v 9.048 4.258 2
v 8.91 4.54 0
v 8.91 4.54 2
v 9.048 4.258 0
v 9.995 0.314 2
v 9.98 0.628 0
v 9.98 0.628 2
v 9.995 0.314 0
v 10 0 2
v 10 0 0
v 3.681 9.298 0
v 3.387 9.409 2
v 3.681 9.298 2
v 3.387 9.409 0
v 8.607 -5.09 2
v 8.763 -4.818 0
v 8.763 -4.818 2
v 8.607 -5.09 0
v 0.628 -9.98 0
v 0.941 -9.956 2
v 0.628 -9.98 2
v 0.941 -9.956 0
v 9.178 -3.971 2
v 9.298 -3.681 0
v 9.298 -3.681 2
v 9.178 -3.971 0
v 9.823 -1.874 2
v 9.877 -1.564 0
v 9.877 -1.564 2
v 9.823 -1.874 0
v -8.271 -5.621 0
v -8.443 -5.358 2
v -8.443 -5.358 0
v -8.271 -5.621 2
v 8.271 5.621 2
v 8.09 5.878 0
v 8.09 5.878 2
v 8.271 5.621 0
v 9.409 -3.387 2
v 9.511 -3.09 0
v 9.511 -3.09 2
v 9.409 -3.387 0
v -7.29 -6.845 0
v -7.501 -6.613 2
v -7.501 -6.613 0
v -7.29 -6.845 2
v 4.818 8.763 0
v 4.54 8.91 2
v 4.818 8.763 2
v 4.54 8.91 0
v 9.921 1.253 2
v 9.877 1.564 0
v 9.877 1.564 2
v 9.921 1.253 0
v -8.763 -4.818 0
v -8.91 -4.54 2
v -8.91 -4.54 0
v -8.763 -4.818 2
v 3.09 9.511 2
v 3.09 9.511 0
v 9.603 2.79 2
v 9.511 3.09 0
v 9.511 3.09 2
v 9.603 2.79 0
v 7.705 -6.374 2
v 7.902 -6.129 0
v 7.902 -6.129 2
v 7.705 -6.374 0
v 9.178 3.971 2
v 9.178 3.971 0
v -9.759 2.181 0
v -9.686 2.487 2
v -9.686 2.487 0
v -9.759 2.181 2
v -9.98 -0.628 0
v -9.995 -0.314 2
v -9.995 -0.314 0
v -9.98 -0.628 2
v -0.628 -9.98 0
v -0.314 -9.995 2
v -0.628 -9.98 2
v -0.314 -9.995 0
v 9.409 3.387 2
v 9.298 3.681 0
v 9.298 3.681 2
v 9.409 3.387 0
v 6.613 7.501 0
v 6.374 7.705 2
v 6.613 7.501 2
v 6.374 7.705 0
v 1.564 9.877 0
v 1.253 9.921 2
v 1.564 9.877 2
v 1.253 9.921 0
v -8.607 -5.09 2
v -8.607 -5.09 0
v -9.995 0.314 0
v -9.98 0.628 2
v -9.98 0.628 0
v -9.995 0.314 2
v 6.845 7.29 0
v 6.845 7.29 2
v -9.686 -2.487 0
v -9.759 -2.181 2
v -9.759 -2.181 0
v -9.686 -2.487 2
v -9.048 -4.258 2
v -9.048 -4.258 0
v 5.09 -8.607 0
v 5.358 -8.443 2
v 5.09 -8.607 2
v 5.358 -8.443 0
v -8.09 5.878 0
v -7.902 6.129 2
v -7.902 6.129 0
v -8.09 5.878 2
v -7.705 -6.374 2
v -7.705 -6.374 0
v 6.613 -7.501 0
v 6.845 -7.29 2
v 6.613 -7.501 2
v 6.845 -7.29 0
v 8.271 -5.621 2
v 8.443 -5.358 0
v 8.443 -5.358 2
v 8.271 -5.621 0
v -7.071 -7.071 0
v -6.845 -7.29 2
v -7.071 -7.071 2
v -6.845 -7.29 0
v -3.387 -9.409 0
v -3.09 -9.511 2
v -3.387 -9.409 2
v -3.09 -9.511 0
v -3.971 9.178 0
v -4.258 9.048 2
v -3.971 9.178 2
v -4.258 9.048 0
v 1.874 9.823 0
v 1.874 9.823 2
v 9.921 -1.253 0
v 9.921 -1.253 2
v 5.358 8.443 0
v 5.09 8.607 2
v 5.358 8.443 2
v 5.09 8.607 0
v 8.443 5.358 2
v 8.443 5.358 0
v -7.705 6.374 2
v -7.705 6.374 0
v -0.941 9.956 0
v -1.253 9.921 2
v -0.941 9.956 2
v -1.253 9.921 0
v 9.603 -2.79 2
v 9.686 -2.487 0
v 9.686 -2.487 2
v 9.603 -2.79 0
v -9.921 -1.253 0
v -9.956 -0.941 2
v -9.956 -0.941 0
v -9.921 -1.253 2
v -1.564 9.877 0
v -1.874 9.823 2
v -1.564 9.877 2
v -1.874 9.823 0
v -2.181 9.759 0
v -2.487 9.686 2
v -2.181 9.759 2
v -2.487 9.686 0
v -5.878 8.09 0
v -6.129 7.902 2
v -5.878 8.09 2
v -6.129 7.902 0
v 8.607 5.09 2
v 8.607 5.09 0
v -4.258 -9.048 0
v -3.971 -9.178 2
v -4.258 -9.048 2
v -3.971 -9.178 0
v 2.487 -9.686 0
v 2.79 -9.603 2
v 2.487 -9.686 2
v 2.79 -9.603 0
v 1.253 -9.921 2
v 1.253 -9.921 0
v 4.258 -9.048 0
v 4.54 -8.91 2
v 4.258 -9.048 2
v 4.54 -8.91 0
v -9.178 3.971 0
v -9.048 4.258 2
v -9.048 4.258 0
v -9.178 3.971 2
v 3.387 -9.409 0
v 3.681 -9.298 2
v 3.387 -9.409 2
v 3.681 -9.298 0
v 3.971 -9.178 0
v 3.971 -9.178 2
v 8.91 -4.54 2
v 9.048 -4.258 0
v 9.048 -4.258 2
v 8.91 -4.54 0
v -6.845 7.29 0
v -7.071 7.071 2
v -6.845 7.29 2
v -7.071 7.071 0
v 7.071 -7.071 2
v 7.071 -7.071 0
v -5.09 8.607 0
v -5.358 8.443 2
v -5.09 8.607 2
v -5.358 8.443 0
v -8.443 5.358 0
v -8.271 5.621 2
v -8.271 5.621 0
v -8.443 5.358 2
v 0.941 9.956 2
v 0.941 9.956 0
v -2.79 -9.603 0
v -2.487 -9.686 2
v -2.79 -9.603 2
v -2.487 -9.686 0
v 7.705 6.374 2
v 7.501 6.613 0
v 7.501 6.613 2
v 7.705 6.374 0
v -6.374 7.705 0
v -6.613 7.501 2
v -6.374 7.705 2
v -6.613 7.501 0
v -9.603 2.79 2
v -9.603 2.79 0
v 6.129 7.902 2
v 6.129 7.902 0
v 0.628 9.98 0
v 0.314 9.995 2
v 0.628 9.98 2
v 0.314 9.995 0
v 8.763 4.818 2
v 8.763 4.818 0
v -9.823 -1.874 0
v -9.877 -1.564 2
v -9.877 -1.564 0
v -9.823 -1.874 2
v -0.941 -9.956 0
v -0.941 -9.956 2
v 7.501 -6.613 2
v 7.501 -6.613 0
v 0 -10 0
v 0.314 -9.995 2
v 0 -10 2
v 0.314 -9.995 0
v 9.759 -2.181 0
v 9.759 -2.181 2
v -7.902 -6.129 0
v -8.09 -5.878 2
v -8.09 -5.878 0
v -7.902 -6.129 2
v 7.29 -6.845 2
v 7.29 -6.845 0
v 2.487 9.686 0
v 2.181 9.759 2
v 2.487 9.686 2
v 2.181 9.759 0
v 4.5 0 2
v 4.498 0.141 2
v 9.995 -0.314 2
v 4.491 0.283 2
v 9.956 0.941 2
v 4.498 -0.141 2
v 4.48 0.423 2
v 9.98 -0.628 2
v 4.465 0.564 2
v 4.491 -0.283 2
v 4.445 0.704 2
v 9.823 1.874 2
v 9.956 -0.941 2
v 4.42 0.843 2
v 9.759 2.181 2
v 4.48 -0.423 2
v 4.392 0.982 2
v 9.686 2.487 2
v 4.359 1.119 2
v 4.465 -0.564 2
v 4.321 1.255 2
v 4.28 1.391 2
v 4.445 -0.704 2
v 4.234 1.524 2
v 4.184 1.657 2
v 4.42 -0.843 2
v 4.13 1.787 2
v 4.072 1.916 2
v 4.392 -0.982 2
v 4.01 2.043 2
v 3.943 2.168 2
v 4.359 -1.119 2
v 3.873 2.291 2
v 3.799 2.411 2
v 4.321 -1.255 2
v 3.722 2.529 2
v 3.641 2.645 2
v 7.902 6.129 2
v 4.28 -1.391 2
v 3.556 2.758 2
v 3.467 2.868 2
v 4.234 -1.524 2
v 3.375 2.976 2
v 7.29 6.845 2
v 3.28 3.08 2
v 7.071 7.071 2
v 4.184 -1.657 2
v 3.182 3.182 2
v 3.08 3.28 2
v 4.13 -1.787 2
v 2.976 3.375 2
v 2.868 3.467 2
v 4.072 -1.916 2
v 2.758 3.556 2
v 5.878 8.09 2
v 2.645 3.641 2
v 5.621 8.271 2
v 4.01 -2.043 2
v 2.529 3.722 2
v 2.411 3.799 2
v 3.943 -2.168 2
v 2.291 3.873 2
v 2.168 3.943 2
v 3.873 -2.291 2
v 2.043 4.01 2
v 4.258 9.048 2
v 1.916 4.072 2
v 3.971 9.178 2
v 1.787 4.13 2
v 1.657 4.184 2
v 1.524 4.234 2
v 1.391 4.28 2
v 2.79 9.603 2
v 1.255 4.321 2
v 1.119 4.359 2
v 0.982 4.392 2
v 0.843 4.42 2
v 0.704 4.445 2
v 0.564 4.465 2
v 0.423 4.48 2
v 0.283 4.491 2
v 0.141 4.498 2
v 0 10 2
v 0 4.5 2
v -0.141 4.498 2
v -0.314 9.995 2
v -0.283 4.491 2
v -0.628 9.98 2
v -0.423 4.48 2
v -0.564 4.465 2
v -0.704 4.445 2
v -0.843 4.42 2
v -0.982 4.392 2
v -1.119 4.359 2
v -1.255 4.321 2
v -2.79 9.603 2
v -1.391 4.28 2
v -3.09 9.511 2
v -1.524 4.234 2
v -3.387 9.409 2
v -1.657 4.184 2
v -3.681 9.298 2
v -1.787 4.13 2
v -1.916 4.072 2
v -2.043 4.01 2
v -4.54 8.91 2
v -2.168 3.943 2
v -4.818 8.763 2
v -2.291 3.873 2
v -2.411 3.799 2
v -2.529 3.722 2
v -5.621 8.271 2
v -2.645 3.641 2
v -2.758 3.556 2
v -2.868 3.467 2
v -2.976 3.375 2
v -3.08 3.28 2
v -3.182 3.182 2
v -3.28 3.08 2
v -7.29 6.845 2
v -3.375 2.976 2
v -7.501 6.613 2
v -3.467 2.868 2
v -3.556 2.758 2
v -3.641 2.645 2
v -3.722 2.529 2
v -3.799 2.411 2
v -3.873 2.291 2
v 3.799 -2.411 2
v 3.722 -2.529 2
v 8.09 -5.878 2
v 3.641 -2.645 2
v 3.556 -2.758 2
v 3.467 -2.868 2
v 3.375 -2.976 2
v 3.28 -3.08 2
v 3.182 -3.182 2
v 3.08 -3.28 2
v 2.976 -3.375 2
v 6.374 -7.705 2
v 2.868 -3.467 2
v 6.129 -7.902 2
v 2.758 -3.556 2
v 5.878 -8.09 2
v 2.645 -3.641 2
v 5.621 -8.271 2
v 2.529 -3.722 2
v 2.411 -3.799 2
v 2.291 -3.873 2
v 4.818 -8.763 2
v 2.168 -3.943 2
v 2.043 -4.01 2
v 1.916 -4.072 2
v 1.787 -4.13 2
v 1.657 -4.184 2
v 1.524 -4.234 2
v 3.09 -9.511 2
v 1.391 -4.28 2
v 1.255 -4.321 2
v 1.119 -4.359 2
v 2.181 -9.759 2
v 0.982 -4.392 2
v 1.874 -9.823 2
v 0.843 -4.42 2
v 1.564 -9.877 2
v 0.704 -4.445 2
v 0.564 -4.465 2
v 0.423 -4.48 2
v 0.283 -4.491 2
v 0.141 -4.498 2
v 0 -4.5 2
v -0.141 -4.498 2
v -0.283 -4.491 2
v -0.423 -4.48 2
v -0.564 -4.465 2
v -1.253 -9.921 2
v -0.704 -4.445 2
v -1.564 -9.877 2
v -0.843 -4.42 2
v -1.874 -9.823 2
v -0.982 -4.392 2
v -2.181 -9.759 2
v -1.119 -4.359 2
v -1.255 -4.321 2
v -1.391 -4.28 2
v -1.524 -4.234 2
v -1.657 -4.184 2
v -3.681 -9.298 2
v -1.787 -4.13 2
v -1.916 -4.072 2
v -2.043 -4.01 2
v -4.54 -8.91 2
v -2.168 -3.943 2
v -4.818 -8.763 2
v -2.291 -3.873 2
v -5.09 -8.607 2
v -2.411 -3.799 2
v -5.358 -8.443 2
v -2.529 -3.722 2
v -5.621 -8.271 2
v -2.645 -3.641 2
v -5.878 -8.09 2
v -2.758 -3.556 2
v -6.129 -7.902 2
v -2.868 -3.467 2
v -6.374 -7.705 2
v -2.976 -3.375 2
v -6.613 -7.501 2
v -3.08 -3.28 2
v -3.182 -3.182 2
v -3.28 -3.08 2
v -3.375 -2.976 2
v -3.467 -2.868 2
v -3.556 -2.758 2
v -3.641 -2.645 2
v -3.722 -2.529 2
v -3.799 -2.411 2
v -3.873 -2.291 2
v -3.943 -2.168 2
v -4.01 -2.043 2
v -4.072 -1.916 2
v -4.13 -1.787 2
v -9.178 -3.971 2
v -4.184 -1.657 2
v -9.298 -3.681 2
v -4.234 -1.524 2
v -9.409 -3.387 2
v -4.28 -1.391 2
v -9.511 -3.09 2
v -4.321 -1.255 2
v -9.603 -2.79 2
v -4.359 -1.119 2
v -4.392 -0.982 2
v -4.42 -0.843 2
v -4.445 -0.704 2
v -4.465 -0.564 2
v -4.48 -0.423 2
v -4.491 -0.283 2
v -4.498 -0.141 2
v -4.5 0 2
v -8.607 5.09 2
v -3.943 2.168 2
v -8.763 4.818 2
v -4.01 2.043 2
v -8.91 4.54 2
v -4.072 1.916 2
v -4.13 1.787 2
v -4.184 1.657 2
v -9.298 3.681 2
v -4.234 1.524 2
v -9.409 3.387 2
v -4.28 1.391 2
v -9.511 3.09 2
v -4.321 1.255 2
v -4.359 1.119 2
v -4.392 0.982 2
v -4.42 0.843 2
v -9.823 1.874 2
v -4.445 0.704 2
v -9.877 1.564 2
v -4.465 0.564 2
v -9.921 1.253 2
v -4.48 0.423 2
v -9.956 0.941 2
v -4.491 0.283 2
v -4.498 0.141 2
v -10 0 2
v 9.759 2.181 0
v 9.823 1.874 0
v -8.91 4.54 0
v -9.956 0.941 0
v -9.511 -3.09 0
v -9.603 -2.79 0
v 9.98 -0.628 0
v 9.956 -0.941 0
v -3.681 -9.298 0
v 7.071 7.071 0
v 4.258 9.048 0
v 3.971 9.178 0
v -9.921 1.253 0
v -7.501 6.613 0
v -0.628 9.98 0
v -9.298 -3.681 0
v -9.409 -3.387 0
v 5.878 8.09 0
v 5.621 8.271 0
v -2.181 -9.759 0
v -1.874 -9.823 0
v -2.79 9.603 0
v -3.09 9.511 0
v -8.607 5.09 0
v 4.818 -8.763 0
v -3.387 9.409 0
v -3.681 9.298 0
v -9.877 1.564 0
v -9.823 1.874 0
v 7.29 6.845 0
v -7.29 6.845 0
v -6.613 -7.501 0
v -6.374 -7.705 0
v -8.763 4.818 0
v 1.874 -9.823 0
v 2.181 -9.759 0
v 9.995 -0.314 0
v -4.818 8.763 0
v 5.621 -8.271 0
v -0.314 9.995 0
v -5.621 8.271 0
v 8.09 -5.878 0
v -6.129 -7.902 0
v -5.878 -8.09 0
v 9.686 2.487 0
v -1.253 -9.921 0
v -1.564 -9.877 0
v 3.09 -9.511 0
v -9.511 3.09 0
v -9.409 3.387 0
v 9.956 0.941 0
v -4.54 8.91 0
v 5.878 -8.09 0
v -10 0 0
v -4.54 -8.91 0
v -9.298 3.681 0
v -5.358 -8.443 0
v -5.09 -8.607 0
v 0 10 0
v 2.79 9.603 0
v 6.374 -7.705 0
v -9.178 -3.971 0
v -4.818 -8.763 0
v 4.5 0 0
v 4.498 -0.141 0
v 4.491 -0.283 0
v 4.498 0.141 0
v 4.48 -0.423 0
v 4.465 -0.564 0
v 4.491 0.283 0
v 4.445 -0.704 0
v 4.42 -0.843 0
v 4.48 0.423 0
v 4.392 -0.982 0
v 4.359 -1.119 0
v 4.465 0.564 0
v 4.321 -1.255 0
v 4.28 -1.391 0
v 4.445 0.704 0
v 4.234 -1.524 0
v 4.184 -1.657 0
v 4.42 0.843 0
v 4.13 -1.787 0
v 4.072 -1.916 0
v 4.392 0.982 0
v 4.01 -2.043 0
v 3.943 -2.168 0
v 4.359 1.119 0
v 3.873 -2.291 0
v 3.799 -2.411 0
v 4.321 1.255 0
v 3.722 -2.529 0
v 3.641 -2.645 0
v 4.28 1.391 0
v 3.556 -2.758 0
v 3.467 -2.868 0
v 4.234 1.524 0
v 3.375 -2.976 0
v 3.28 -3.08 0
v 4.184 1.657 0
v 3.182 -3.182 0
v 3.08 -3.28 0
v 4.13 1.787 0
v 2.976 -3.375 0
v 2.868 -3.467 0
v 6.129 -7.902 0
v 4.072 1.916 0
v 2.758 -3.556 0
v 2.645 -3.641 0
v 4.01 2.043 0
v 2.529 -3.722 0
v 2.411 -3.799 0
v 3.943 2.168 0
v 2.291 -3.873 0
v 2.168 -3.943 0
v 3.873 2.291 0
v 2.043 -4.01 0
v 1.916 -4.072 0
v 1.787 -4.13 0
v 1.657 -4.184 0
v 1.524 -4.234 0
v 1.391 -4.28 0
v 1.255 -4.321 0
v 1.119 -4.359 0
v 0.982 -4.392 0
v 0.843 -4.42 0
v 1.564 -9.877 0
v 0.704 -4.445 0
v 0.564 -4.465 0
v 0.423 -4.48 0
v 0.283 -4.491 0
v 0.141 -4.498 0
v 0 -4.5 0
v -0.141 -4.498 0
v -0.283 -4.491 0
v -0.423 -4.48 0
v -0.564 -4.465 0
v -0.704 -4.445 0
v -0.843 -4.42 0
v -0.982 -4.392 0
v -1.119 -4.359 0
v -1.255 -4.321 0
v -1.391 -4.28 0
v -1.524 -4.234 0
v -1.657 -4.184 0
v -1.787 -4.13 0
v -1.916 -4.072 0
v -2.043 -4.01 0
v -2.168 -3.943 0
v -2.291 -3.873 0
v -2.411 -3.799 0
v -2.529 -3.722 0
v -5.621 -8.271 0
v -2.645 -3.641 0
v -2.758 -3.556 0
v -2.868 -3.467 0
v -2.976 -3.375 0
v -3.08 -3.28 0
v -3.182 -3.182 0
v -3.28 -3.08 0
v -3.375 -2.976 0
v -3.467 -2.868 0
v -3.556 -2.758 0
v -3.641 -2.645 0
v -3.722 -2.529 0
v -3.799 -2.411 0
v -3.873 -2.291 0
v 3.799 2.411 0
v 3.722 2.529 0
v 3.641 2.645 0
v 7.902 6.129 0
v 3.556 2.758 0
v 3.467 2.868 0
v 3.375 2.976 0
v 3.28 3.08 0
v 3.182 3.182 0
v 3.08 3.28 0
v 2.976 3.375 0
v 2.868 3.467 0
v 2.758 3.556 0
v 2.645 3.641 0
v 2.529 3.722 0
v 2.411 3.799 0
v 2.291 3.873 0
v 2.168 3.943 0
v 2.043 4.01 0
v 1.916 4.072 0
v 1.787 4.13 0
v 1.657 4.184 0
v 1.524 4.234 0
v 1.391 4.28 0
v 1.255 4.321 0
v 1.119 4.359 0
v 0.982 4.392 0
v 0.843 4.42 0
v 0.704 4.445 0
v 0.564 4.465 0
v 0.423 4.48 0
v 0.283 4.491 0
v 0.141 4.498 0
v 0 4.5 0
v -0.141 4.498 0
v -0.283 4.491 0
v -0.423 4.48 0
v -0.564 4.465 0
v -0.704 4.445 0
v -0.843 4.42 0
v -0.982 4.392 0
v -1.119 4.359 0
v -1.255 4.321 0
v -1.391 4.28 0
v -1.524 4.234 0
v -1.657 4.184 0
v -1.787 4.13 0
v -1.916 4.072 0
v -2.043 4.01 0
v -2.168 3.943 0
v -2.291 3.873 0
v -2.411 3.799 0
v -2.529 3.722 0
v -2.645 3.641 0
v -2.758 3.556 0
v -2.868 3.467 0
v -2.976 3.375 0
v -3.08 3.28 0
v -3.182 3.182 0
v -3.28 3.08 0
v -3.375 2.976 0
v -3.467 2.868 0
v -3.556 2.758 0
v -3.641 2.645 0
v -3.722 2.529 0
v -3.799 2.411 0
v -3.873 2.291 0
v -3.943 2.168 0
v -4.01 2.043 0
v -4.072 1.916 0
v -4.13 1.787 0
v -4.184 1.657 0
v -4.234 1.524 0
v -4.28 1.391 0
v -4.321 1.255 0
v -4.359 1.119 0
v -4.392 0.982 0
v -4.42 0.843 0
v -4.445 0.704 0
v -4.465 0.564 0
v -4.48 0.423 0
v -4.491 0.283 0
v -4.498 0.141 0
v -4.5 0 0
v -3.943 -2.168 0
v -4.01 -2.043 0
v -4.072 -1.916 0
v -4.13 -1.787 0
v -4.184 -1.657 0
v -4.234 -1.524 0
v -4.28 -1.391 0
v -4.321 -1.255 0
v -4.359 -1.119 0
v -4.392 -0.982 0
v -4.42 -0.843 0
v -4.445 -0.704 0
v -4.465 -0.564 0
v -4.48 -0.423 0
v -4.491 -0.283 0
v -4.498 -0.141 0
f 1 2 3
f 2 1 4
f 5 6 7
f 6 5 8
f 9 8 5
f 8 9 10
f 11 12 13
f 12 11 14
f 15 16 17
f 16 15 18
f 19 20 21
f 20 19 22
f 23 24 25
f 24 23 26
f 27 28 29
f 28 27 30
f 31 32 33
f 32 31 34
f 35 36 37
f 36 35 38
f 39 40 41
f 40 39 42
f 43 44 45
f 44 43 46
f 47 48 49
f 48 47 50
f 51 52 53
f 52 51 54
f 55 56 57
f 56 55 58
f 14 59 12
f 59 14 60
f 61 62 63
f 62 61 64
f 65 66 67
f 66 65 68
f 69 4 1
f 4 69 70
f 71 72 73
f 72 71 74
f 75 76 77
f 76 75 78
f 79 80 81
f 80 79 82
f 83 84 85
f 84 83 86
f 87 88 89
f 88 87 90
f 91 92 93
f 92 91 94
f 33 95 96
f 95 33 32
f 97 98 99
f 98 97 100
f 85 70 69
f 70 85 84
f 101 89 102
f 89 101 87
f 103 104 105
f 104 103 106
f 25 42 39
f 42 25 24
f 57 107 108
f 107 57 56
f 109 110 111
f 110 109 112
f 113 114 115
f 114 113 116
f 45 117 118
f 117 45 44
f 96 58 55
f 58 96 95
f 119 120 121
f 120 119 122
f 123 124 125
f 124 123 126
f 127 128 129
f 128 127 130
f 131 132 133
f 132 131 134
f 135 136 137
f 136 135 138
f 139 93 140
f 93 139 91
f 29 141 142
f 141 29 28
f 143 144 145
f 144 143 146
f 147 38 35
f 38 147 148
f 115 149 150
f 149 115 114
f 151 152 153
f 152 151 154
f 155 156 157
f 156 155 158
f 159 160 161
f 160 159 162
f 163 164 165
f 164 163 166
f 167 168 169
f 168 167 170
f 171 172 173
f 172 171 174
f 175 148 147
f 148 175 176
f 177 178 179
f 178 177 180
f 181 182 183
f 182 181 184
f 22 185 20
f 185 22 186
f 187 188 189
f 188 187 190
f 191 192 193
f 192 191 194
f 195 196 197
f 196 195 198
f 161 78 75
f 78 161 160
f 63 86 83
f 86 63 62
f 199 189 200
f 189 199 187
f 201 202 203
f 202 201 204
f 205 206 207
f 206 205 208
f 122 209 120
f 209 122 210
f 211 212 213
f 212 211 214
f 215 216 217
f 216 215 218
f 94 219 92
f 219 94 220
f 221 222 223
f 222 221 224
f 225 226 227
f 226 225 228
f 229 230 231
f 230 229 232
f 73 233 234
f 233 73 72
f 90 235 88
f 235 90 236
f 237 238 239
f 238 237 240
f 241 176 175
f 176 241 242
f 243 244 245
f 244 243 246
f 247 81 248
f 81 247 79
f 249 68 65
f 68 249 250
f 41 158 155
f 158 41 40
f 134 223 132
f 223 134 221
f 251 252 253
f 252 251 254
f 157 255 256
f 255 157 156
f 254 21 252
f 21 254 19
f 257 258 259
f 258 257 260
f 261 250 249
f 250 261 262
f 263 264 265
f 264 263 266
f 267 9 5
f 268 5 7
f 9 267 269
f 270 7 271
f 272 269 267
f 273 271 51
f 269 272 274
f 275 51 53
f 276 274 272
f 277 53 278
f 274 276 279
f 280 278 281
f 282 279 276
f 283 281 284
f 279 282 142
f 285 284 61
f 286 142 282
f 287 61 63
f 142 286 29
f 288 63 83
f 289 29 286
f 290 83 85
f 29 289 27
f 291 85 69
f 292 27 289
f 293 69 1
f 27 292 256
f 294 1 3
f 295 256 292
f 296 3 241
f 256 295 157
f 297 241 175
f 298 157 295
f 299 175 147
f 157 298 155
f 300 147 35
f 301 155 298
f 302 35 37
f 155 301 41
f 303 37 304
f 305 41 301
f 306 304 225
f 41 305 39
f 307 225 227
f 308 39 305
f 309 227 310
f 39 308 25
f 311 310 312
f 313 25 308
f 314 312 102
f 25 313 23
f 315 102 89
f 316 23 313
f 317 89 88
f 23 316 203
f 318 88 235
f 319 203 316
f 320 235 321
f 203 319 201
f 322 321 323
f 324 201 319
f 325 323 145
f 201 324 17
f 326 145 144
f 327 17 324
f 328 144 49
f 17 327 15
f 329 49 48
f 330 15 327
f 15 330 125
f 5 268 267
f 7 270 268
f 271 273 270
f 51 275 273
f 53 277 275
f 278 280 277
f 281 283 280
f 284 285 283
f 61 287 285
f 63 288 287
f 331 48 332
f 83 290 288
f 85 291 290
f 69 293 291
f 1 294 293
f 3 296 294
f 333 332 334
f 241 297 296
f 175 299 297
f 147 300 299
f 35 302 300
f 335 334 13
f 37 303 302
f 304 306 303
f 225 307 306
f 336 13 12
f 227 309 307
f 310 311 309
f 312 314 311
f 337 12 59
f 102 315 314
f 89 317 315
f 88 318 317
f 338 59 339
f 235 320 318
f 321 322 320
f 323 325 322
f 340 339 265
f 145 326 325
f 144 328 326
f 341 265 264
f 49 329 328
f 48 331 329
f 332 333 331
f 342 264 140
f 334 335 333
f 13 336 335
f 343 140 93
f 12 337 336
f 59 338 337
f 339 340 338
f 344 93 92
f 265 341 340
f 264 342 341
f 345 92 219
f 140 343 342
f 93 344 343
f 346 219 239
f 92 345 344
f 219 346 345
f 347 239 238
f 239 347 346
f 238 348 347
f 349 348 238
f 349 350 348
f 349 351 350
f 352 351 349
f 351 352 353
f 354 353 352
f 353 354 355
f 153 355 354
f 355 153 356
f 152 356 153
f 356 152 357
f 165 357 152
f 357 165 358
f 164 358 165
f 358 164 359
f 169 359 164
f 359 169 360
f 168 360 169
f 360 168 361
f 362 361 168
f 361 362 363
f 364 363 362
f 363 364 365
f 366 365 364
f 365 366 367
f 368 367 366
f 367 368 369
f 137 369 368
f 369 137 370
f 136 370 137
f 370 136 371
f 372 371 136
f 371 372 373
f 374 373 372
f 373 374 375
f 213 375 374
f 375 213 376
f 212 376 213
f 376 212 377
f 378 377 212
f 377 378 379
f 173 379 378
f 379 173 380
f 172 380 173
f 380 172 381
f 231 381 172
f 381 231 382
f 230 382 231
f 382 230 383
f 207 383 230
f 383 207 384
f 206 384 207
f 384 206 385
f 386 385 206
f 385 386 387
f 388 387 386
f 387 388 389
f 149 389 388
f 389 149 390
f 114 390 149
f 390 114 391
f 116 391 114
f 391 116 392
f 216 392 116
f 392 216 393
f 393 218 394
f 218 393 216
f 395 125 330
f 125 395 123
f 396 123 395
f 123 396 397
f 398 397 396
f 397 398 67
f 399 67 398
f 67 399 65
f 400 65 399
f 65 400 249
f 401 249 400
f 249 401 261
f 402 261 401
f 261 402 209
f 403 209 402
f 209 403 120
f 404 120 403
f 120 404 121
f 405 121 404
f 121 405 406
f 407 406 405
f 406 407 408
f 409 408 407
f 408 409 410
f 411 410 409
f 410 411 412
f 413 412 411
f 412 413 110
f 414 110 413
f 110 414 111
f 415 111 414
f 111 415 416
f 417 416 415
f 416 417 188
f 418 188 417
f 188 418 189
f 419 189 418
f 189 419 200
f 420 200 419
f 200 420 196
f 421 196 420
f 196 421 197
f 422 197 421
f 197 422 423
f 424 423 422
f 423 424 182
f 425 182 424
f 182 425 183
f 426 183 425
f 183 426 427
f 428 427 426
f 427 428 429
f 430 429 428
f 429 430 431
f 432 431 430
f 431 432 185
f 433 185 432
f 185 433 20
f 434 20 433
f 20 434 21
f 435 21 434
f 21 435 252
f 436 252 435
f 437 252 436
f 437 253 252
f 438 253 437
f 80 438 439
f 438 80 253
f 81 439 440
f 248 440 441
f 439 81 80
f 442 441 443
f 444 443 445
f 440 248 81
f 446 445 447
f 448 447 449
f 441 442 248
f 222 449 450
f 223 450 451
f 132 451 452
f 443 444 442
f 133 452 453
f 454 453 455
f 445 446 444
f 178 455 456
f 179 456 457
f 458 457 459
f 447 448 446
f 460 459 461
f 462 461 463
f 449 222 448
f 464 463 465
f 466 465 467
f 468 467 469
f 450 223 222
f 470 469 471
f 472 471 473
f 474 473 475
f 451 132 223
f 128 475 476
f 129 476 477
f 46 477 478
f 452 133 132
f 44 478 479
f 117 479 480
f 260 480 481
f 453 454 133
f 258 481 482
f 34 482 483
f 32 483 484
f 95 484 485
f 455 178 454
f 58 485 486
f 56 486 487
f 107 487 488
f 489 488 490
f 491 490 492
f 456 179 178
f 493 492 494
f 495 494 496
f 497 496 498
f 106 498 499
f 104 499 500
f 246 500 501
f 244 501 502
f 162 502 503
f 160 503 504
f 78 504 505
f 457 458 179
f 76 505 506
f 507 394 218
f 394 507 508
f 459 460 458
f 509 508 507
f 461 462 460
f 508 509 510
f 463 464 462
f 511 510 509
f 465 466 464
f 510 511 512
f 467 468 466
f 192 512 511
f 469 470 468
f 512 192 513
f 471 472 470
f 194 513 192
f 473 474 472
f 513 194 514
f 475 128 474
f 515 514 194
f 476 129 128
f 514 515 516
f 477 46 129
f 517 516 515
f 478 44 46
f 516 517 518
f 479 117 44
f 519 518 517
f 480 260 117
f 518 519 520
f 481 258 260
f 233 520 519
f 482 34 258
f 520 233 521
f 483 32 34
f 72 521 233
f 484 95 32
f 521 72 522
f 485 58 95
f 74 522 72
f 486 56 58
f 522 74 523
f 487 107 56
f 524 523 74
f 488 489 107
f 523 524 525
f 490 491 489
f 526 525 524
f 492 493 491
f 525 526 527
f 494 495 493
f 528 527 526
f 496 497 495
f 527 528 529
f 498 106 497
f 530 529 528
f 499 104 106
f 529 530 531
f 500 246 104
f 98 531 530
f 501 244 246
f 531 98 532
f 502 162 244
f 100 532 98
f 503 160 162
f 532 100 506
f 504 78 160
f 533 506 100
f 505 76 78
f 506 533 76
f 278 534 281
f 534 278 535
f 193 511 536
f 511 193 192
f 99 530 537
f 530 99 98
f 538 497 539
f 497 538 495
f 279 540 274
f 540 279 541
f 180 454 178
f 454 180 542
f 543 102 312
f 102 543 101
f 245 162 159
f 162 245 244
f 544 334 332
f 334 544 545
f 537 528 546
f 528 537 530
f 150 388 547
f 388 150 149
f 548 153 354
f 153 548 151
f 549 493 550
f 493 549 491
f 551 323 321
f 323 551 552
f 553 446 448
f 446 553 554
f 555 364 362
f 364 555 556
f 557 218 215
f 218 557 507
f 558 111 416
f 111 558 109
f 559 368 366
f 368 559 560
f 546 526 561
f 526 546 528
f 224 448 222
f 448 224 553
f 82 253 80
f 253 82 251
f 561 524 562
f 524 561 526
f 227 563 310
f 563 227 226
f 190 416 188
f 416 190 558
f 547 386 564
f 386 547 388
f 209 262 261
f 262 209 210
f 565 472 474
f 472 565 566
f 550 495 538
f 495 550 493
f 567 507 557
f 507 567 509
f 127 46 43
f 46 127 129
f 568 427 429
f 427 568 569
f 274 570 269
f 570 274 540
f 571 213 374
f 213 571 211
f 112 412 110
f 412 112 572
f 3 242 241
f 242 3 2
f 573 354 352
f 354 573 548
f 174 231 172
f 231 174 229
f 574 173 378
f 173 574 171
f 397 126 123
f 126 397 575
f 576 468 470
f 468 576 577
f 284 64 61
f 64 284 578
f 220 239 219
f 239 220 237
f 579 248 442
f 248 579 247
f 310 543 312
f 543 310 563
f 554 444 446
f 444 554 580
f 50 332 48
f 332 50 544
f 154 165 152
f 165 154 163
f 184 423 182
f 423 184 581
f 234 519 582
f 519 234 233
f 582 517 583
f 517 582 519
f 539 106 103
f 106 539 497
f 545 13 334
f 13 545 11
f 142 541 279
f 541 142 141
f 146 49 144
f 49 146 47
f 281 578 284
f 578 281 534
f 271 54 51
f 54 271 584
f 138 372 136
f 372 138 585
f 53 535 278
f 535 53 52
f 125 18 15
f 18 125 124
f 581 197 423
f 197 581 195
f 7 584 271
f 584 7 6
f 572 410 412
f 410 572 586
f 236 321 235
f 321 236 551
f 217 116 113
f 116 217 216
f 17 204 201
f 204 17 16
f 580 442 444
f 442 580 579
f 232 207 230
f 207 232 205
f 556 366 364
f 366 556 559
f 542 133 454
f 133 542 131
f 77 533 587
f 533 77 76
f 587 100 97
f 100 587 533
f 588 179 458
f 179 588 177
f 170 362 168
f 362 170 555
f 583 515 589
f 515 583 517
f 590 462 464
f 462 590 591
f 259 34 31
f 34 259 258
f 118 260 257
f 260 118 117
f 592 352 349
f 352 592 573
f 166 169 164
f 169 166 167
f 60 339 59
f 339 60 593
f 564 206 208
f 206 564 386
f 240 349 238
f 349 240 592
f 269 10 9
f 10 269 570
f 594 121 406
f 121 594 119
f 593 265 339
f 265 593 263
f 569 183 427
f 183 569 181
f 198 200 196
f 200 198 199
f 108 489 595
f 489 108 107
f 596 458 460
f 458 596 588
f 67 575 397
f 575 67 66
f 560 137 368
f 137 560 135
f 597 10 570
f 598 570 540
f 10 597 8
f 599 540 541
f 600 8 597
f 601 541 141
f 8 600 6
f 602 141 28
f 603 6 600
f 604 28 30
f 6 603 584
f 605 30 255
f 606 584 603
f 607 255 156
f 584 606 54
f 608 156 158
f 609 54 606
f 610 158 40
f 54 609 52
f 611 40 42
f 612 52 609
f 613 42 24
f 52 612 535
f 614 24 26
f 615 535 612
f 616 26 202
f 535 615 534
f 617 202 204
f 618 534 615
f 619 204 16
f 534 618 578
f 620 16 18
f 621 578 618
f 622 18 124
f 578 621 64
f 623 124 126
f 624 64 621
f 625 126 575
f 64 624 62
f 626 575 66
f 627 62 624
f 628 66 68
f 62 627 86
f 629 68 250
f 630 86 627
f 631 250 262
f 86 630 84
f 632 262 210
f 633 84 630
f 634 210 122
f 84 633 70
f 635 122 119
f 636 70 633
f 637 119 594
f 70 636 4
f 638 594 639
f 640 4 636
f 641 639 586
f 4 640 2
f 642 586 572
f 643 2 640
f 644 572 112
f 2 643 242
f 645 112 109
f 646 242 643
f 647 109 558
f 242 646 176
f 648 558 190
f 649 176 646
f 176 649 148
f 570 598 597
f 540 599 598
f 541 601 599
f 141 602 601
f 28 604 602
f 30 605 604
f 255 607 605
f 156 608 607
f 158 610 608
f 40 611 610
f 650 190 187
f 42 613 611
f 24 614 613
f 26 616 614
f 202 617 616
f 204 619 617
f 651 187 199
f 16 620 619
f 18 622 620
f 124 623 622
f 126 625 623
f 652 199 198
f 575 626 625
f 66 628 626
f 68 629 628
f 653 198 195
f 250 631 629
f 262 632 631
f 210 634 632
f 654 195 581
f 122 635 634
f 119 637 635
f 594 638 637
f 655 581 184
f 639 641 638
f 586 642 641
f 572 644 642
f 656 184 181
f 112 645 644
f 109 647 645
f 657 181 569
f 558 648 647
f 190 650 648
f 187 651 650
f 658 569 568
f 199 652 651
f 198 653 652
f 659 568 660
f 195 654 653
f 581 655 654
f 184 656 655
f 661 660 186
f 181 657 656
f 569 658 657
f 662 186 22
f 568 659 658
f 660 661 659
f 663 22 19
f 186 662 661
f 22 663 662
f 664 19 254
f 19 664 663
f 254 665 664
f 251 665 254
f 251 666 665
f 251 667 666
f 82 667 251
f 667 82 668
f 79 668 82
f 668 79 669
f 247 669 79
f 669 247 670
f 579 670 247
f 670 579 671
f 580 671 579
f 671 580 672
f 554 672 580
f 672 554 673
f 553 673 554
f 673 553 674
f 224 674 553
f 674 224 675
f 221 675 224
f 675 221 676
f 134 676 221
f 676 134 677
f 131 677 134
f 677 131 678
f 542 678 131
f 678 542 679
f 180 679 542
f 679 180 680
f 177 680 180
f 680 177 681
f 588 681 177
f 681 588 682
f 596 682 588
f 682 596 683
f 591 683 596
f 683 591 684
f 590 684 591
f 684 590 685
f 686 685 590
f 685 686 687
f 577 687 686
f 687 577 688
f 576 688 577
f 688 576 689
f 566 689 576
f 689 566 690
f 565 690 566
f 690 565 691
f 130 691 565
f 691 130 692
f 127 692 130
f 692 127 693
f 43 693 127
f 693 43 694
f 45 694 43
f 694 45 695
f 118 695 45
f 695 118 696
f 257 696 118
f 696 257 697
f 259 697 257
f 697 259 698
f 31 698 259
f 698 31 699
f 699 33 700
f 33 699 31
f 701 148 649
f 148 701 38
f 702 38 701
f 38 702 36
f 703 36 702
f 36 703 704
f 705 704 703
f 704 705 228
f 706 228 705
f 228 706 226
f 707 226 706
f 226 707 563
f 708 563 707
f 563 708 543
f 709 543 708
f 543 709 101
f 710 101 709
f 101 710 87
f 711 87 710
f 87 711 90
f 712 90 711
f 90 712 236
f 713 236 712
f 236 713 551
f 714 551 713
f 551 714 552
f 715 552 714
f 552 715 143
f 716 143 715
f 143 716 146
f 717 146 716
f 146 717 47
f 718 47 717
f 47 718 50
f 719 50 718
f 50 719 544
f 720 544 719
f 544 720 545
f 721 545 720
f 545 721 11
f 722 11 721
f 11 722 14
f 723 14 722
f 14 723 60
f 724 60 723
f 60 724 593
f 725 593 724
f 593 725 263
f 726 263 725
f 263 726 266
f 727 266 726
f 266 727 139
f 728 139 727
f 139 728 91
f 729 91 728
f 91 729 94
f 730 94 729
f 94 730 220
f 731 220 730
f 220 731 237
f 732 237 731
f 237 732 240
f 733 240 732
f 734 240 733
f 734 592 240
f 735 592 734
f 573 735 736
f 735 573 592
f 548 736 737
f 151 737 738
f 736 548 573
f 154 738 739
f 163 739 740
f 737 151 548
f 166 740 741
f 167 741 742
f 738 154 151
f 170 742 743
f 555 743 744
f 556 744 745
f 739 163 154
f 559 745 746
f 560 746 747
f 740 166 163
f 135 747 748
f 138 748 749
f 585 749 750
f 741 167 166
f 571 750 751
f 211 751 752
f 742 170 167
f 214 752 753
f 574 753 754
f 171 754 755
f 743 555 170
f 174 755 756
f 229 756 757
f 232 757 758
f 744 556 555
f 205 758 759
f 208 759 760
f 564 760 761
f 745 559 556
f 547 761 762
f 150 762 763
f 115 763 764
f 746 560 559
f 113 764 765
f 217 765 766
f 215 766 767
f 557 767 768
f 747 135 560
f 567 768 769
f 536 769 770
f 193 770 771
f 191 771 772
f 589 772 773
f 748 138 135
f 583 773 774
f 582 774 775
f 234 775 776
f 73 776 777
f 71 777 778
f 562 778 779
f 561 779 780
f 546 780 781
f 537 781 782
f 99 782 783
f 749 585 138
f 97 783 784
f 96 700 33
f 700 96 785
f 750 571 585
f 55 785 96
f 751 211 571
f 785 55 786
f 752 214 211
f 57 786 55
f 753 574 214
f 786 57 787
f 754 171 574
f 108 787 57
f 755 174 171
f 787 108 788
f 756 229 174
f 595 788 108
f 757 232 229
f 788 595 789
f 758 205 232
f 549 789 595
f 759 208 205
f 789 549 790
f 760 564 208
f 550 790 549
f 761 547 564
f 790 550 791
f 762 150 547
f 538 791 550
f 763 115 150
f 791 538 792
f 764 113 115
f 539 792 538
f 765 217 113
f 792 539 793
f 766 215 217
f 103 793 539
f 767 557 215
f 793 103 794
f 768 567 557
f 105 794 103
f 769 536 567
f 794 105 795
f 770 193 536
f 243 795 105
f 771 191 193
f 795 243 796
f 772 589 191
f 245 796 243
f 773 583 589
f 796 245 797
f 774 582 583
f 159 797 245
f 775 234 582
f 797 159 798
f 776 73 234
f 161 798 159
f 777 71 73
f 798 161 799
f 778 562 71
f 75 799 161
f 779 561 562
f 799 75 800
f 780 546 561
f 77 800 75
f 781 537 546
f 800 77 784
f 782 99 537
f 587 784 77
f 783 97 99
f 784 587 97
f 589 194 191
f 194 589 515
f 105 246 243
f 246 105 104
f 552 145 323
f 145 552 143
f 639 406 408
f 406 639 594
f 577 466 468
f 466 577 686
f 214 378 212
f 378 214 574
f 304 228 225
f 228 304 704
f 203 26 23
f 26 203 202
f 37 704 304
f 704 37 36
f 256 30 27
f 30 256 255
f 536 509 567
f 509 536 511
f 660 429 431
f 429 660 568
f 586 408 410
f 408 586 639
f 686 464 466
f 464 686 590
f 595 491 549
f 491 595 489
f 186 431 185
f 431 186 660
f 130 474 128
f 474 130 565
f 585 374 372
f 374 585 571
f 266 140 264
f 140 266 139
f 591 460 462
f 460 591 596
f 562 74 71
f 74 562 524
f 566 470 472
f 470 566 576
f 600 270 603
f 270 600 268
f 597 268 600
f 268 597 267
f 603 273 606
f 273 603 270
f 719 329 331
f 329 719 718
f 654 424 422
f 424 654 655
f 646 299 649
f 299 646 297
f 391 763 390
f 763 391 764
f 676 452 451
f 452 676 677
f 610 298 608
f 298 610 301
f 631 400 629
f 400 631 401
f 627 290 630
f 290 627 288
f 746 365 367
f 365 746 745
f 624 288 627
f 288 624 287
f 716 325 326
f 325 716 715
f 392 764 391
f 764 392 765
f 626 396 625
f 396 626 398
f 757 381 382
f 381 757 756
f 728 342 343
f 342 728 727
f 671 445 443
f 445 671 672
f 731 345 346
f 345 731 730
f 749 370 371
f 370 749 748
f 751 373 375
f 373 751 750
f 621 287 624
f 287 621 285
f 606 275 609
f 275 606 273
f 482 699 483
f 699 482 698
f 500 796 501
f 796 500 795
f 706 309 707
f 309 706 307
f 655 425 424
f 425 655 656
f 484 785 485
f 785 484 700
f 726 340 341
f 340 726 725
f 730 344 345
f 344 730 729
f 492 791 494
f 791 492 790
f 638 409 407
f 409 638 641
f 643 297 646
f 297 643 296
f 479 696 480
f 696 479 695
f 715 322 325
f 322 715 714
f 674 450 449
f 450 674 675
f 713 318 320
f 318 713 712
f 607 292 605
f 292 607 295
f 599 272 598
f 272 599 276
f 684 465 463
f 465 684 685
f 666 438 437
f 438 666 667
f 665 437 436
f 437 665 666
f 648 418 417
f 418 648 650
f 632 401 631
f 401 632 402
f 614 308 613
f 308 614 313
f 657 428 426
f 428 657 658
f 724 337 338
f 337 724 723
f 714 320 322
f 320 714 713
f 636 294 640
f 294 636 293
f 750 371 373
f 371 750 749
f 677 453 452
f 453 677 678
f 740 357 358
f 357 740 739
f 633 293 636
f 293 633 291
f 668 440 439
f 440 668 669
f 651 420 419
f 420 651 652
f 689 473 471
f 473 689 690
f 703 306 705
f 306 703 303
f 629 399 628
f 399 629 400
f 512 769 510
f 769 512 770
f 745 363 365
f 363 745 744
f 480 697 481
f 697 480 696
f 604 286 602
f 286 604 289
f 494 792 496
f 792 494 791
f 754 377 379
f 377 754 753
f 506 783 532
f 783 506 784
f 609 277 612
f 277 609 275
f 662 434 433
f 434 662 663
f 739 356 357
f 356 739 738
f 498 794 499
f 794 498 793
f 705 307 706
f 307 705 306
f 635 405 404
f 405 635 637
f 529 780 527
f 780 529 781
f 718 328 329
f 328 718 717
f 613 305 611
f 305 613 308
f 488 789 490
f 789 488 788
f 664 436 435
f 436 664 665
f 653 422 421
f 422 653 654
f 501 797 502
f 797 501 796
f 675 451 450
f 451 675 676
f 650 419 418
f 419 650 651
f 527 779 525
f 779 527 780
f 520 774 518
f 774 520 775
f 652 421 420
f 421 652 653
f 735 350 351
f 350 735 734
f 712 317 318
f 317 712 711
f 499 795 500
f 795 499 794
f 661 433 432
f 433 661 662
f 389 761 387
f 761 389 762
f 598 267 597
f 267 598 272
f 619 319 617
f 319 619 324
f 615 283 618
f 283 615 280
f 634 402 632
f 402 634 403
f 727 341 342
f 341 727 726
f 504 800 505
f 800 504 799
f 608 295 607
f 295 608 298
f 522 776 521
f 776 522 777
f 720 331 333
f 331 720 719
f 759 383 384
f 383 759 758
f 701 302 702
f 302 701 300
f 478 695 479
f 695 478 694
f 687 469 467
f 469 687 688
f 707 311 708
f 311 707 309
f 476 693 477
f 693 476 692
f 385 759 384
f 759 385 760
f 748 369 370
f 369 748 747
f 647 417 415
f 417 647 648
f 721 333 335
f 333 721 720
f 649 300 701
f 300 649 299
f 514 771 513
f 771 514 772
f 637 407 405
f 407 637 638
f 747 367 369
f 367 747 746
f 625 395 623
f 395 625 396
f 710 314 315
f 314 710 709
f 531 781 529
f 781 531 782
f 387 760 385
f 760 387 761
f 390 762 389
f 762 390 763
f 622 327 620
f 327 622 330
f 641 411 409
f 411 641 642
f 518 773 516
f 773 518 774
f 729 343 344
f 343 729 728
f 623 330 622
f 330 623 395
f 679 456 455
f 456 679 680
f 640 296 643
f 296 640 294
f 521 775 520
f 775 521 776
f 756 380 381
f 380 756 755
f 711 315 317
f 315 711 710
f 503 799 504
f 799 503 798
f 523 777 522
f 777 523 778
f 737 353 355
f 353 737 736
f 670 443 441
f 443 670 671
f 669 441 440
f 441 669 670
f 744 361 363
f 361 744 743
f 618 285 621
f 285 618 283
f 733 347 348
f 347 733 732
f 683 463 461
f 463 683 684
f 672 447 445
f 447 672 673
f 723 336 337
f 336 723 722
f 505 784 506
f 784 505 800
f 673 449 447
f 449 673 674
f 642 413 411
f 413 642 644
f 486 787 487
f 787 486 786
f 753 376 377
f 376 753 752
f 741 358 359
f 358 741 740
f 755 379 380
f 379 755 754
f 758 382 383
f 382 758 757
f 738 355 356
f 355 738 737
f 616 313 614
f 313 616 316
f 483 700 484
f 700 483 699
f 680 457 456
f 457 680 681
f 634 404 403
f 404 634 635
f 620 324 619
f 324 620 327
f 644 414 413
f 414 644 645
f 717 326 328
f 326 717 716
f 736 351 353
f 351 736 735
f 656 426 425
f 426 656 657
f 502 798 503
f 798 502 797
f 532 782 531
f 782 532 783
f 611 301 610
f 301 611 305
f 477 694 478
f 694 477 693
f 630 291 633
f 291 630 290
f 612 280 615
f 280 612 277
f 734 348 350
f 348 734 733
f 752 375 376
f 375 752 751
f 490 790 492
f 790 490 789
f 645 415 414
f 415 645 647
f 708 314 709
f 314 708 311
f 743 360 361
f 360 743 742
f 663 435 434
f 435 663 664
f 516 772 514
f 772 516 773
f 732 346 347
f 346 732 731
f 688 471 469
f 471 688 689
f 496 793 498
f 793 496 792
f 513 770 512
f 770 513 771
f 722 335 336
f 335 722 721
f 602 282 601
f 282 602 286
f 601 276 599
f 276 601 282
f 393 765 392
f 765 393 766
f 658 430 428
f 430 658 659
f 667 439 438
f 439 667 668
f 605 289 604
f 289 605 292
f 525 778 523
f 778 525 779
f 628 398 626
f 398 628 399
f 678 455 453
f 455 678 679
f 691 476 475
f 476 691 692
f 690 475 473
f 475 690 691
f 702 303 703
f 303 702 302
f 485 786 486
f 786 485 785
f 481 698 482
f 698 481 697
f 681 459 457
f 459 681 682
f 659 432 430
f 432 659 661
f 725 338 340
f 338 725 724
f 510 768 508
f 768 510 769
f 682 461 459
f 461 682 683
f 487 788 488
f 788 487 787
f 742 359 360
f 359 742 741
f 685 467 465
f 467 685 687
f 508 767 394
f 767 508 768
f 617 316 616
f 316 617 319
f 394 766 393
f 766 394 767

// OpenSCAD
module cone(macho) {
  difference(){
    cylinder(d1 = 90, d2 = 60, h = 30, $fn = 200);

    // Eje
    translate([0,0,-1]) cylinder(d = 10, h = 32, $fn = 200);
    // Rodamiento 1
    translate([0,0,-1]) cylinder(d = 22, h = 9, $fn = 200);
    // Rodamiento 2
    translate([0,0,30-8]) cylinder(d = 22, h = 9, $fn = 200);

    // Tornillos
    for (i = [0, 120, 240]) {
        rotate([0,0,i]) {
            translate([20,0,-1]) {
                cylinder(d = 12, h = 30 - 5, $fn = 200);
                cylinder(d = 4 + 0.2, h = 32, $fn = 200);
            }
        }
    } 
    if (!macho) {
        // Guias
        for (i = [60, 180, 300]) {
            rotate([0,0,i]) {
                translate([20,0,-1])  cylinder(d = 10 + 0.2, h = 32, $fn = 200);
            }
        } 
    }
  }
  if (macho) {
        // Guias
        for (i = [60, 180, 300]) {
            rotate([0,0,i]) {
                translate([20,0,0]) cylinder(d = 10, h = 75, $fn = 200);
                translate([20,0,75]) cylinder(d1 = 10, d2 = 6, h = 5, $fn = 200);
            }
        } 
    }
}

// cone(true);

module key() {
    difference() {
        union(){
            cylinder(d = 11, h = 40, $fn = 200);
            cube([40,11,10], center = true);
        }
        translate([0,0,40 - 3 + 0.001]) cylinder(d = 8 + 0.2, h = 3, $fn = 6);
        translate([0,0,-10]) cylinder(d = 4 + 0.5, h = 50, $fn = 200);
    }
    
}

// key();
module holder() {
   difference(){
        cube([40,40,40]); 
        translate([(40-15-0.2)/2,40-26,-1]) cube([15 + 0.2,27,62]);
   } 
   translate([40-1,40/2,40/2]) rotate([0,90,0]) cylinder(d = 7.5, h = 100 + 1, $fn = 200);
   
}

module washer() {
    difference(){
        cylinder(d = 20, h = 2, $fn = 200);
        translate([0,0,-1]) cylinder(d = 9, h = 4, $fn = 200);
    }
}

washer();
